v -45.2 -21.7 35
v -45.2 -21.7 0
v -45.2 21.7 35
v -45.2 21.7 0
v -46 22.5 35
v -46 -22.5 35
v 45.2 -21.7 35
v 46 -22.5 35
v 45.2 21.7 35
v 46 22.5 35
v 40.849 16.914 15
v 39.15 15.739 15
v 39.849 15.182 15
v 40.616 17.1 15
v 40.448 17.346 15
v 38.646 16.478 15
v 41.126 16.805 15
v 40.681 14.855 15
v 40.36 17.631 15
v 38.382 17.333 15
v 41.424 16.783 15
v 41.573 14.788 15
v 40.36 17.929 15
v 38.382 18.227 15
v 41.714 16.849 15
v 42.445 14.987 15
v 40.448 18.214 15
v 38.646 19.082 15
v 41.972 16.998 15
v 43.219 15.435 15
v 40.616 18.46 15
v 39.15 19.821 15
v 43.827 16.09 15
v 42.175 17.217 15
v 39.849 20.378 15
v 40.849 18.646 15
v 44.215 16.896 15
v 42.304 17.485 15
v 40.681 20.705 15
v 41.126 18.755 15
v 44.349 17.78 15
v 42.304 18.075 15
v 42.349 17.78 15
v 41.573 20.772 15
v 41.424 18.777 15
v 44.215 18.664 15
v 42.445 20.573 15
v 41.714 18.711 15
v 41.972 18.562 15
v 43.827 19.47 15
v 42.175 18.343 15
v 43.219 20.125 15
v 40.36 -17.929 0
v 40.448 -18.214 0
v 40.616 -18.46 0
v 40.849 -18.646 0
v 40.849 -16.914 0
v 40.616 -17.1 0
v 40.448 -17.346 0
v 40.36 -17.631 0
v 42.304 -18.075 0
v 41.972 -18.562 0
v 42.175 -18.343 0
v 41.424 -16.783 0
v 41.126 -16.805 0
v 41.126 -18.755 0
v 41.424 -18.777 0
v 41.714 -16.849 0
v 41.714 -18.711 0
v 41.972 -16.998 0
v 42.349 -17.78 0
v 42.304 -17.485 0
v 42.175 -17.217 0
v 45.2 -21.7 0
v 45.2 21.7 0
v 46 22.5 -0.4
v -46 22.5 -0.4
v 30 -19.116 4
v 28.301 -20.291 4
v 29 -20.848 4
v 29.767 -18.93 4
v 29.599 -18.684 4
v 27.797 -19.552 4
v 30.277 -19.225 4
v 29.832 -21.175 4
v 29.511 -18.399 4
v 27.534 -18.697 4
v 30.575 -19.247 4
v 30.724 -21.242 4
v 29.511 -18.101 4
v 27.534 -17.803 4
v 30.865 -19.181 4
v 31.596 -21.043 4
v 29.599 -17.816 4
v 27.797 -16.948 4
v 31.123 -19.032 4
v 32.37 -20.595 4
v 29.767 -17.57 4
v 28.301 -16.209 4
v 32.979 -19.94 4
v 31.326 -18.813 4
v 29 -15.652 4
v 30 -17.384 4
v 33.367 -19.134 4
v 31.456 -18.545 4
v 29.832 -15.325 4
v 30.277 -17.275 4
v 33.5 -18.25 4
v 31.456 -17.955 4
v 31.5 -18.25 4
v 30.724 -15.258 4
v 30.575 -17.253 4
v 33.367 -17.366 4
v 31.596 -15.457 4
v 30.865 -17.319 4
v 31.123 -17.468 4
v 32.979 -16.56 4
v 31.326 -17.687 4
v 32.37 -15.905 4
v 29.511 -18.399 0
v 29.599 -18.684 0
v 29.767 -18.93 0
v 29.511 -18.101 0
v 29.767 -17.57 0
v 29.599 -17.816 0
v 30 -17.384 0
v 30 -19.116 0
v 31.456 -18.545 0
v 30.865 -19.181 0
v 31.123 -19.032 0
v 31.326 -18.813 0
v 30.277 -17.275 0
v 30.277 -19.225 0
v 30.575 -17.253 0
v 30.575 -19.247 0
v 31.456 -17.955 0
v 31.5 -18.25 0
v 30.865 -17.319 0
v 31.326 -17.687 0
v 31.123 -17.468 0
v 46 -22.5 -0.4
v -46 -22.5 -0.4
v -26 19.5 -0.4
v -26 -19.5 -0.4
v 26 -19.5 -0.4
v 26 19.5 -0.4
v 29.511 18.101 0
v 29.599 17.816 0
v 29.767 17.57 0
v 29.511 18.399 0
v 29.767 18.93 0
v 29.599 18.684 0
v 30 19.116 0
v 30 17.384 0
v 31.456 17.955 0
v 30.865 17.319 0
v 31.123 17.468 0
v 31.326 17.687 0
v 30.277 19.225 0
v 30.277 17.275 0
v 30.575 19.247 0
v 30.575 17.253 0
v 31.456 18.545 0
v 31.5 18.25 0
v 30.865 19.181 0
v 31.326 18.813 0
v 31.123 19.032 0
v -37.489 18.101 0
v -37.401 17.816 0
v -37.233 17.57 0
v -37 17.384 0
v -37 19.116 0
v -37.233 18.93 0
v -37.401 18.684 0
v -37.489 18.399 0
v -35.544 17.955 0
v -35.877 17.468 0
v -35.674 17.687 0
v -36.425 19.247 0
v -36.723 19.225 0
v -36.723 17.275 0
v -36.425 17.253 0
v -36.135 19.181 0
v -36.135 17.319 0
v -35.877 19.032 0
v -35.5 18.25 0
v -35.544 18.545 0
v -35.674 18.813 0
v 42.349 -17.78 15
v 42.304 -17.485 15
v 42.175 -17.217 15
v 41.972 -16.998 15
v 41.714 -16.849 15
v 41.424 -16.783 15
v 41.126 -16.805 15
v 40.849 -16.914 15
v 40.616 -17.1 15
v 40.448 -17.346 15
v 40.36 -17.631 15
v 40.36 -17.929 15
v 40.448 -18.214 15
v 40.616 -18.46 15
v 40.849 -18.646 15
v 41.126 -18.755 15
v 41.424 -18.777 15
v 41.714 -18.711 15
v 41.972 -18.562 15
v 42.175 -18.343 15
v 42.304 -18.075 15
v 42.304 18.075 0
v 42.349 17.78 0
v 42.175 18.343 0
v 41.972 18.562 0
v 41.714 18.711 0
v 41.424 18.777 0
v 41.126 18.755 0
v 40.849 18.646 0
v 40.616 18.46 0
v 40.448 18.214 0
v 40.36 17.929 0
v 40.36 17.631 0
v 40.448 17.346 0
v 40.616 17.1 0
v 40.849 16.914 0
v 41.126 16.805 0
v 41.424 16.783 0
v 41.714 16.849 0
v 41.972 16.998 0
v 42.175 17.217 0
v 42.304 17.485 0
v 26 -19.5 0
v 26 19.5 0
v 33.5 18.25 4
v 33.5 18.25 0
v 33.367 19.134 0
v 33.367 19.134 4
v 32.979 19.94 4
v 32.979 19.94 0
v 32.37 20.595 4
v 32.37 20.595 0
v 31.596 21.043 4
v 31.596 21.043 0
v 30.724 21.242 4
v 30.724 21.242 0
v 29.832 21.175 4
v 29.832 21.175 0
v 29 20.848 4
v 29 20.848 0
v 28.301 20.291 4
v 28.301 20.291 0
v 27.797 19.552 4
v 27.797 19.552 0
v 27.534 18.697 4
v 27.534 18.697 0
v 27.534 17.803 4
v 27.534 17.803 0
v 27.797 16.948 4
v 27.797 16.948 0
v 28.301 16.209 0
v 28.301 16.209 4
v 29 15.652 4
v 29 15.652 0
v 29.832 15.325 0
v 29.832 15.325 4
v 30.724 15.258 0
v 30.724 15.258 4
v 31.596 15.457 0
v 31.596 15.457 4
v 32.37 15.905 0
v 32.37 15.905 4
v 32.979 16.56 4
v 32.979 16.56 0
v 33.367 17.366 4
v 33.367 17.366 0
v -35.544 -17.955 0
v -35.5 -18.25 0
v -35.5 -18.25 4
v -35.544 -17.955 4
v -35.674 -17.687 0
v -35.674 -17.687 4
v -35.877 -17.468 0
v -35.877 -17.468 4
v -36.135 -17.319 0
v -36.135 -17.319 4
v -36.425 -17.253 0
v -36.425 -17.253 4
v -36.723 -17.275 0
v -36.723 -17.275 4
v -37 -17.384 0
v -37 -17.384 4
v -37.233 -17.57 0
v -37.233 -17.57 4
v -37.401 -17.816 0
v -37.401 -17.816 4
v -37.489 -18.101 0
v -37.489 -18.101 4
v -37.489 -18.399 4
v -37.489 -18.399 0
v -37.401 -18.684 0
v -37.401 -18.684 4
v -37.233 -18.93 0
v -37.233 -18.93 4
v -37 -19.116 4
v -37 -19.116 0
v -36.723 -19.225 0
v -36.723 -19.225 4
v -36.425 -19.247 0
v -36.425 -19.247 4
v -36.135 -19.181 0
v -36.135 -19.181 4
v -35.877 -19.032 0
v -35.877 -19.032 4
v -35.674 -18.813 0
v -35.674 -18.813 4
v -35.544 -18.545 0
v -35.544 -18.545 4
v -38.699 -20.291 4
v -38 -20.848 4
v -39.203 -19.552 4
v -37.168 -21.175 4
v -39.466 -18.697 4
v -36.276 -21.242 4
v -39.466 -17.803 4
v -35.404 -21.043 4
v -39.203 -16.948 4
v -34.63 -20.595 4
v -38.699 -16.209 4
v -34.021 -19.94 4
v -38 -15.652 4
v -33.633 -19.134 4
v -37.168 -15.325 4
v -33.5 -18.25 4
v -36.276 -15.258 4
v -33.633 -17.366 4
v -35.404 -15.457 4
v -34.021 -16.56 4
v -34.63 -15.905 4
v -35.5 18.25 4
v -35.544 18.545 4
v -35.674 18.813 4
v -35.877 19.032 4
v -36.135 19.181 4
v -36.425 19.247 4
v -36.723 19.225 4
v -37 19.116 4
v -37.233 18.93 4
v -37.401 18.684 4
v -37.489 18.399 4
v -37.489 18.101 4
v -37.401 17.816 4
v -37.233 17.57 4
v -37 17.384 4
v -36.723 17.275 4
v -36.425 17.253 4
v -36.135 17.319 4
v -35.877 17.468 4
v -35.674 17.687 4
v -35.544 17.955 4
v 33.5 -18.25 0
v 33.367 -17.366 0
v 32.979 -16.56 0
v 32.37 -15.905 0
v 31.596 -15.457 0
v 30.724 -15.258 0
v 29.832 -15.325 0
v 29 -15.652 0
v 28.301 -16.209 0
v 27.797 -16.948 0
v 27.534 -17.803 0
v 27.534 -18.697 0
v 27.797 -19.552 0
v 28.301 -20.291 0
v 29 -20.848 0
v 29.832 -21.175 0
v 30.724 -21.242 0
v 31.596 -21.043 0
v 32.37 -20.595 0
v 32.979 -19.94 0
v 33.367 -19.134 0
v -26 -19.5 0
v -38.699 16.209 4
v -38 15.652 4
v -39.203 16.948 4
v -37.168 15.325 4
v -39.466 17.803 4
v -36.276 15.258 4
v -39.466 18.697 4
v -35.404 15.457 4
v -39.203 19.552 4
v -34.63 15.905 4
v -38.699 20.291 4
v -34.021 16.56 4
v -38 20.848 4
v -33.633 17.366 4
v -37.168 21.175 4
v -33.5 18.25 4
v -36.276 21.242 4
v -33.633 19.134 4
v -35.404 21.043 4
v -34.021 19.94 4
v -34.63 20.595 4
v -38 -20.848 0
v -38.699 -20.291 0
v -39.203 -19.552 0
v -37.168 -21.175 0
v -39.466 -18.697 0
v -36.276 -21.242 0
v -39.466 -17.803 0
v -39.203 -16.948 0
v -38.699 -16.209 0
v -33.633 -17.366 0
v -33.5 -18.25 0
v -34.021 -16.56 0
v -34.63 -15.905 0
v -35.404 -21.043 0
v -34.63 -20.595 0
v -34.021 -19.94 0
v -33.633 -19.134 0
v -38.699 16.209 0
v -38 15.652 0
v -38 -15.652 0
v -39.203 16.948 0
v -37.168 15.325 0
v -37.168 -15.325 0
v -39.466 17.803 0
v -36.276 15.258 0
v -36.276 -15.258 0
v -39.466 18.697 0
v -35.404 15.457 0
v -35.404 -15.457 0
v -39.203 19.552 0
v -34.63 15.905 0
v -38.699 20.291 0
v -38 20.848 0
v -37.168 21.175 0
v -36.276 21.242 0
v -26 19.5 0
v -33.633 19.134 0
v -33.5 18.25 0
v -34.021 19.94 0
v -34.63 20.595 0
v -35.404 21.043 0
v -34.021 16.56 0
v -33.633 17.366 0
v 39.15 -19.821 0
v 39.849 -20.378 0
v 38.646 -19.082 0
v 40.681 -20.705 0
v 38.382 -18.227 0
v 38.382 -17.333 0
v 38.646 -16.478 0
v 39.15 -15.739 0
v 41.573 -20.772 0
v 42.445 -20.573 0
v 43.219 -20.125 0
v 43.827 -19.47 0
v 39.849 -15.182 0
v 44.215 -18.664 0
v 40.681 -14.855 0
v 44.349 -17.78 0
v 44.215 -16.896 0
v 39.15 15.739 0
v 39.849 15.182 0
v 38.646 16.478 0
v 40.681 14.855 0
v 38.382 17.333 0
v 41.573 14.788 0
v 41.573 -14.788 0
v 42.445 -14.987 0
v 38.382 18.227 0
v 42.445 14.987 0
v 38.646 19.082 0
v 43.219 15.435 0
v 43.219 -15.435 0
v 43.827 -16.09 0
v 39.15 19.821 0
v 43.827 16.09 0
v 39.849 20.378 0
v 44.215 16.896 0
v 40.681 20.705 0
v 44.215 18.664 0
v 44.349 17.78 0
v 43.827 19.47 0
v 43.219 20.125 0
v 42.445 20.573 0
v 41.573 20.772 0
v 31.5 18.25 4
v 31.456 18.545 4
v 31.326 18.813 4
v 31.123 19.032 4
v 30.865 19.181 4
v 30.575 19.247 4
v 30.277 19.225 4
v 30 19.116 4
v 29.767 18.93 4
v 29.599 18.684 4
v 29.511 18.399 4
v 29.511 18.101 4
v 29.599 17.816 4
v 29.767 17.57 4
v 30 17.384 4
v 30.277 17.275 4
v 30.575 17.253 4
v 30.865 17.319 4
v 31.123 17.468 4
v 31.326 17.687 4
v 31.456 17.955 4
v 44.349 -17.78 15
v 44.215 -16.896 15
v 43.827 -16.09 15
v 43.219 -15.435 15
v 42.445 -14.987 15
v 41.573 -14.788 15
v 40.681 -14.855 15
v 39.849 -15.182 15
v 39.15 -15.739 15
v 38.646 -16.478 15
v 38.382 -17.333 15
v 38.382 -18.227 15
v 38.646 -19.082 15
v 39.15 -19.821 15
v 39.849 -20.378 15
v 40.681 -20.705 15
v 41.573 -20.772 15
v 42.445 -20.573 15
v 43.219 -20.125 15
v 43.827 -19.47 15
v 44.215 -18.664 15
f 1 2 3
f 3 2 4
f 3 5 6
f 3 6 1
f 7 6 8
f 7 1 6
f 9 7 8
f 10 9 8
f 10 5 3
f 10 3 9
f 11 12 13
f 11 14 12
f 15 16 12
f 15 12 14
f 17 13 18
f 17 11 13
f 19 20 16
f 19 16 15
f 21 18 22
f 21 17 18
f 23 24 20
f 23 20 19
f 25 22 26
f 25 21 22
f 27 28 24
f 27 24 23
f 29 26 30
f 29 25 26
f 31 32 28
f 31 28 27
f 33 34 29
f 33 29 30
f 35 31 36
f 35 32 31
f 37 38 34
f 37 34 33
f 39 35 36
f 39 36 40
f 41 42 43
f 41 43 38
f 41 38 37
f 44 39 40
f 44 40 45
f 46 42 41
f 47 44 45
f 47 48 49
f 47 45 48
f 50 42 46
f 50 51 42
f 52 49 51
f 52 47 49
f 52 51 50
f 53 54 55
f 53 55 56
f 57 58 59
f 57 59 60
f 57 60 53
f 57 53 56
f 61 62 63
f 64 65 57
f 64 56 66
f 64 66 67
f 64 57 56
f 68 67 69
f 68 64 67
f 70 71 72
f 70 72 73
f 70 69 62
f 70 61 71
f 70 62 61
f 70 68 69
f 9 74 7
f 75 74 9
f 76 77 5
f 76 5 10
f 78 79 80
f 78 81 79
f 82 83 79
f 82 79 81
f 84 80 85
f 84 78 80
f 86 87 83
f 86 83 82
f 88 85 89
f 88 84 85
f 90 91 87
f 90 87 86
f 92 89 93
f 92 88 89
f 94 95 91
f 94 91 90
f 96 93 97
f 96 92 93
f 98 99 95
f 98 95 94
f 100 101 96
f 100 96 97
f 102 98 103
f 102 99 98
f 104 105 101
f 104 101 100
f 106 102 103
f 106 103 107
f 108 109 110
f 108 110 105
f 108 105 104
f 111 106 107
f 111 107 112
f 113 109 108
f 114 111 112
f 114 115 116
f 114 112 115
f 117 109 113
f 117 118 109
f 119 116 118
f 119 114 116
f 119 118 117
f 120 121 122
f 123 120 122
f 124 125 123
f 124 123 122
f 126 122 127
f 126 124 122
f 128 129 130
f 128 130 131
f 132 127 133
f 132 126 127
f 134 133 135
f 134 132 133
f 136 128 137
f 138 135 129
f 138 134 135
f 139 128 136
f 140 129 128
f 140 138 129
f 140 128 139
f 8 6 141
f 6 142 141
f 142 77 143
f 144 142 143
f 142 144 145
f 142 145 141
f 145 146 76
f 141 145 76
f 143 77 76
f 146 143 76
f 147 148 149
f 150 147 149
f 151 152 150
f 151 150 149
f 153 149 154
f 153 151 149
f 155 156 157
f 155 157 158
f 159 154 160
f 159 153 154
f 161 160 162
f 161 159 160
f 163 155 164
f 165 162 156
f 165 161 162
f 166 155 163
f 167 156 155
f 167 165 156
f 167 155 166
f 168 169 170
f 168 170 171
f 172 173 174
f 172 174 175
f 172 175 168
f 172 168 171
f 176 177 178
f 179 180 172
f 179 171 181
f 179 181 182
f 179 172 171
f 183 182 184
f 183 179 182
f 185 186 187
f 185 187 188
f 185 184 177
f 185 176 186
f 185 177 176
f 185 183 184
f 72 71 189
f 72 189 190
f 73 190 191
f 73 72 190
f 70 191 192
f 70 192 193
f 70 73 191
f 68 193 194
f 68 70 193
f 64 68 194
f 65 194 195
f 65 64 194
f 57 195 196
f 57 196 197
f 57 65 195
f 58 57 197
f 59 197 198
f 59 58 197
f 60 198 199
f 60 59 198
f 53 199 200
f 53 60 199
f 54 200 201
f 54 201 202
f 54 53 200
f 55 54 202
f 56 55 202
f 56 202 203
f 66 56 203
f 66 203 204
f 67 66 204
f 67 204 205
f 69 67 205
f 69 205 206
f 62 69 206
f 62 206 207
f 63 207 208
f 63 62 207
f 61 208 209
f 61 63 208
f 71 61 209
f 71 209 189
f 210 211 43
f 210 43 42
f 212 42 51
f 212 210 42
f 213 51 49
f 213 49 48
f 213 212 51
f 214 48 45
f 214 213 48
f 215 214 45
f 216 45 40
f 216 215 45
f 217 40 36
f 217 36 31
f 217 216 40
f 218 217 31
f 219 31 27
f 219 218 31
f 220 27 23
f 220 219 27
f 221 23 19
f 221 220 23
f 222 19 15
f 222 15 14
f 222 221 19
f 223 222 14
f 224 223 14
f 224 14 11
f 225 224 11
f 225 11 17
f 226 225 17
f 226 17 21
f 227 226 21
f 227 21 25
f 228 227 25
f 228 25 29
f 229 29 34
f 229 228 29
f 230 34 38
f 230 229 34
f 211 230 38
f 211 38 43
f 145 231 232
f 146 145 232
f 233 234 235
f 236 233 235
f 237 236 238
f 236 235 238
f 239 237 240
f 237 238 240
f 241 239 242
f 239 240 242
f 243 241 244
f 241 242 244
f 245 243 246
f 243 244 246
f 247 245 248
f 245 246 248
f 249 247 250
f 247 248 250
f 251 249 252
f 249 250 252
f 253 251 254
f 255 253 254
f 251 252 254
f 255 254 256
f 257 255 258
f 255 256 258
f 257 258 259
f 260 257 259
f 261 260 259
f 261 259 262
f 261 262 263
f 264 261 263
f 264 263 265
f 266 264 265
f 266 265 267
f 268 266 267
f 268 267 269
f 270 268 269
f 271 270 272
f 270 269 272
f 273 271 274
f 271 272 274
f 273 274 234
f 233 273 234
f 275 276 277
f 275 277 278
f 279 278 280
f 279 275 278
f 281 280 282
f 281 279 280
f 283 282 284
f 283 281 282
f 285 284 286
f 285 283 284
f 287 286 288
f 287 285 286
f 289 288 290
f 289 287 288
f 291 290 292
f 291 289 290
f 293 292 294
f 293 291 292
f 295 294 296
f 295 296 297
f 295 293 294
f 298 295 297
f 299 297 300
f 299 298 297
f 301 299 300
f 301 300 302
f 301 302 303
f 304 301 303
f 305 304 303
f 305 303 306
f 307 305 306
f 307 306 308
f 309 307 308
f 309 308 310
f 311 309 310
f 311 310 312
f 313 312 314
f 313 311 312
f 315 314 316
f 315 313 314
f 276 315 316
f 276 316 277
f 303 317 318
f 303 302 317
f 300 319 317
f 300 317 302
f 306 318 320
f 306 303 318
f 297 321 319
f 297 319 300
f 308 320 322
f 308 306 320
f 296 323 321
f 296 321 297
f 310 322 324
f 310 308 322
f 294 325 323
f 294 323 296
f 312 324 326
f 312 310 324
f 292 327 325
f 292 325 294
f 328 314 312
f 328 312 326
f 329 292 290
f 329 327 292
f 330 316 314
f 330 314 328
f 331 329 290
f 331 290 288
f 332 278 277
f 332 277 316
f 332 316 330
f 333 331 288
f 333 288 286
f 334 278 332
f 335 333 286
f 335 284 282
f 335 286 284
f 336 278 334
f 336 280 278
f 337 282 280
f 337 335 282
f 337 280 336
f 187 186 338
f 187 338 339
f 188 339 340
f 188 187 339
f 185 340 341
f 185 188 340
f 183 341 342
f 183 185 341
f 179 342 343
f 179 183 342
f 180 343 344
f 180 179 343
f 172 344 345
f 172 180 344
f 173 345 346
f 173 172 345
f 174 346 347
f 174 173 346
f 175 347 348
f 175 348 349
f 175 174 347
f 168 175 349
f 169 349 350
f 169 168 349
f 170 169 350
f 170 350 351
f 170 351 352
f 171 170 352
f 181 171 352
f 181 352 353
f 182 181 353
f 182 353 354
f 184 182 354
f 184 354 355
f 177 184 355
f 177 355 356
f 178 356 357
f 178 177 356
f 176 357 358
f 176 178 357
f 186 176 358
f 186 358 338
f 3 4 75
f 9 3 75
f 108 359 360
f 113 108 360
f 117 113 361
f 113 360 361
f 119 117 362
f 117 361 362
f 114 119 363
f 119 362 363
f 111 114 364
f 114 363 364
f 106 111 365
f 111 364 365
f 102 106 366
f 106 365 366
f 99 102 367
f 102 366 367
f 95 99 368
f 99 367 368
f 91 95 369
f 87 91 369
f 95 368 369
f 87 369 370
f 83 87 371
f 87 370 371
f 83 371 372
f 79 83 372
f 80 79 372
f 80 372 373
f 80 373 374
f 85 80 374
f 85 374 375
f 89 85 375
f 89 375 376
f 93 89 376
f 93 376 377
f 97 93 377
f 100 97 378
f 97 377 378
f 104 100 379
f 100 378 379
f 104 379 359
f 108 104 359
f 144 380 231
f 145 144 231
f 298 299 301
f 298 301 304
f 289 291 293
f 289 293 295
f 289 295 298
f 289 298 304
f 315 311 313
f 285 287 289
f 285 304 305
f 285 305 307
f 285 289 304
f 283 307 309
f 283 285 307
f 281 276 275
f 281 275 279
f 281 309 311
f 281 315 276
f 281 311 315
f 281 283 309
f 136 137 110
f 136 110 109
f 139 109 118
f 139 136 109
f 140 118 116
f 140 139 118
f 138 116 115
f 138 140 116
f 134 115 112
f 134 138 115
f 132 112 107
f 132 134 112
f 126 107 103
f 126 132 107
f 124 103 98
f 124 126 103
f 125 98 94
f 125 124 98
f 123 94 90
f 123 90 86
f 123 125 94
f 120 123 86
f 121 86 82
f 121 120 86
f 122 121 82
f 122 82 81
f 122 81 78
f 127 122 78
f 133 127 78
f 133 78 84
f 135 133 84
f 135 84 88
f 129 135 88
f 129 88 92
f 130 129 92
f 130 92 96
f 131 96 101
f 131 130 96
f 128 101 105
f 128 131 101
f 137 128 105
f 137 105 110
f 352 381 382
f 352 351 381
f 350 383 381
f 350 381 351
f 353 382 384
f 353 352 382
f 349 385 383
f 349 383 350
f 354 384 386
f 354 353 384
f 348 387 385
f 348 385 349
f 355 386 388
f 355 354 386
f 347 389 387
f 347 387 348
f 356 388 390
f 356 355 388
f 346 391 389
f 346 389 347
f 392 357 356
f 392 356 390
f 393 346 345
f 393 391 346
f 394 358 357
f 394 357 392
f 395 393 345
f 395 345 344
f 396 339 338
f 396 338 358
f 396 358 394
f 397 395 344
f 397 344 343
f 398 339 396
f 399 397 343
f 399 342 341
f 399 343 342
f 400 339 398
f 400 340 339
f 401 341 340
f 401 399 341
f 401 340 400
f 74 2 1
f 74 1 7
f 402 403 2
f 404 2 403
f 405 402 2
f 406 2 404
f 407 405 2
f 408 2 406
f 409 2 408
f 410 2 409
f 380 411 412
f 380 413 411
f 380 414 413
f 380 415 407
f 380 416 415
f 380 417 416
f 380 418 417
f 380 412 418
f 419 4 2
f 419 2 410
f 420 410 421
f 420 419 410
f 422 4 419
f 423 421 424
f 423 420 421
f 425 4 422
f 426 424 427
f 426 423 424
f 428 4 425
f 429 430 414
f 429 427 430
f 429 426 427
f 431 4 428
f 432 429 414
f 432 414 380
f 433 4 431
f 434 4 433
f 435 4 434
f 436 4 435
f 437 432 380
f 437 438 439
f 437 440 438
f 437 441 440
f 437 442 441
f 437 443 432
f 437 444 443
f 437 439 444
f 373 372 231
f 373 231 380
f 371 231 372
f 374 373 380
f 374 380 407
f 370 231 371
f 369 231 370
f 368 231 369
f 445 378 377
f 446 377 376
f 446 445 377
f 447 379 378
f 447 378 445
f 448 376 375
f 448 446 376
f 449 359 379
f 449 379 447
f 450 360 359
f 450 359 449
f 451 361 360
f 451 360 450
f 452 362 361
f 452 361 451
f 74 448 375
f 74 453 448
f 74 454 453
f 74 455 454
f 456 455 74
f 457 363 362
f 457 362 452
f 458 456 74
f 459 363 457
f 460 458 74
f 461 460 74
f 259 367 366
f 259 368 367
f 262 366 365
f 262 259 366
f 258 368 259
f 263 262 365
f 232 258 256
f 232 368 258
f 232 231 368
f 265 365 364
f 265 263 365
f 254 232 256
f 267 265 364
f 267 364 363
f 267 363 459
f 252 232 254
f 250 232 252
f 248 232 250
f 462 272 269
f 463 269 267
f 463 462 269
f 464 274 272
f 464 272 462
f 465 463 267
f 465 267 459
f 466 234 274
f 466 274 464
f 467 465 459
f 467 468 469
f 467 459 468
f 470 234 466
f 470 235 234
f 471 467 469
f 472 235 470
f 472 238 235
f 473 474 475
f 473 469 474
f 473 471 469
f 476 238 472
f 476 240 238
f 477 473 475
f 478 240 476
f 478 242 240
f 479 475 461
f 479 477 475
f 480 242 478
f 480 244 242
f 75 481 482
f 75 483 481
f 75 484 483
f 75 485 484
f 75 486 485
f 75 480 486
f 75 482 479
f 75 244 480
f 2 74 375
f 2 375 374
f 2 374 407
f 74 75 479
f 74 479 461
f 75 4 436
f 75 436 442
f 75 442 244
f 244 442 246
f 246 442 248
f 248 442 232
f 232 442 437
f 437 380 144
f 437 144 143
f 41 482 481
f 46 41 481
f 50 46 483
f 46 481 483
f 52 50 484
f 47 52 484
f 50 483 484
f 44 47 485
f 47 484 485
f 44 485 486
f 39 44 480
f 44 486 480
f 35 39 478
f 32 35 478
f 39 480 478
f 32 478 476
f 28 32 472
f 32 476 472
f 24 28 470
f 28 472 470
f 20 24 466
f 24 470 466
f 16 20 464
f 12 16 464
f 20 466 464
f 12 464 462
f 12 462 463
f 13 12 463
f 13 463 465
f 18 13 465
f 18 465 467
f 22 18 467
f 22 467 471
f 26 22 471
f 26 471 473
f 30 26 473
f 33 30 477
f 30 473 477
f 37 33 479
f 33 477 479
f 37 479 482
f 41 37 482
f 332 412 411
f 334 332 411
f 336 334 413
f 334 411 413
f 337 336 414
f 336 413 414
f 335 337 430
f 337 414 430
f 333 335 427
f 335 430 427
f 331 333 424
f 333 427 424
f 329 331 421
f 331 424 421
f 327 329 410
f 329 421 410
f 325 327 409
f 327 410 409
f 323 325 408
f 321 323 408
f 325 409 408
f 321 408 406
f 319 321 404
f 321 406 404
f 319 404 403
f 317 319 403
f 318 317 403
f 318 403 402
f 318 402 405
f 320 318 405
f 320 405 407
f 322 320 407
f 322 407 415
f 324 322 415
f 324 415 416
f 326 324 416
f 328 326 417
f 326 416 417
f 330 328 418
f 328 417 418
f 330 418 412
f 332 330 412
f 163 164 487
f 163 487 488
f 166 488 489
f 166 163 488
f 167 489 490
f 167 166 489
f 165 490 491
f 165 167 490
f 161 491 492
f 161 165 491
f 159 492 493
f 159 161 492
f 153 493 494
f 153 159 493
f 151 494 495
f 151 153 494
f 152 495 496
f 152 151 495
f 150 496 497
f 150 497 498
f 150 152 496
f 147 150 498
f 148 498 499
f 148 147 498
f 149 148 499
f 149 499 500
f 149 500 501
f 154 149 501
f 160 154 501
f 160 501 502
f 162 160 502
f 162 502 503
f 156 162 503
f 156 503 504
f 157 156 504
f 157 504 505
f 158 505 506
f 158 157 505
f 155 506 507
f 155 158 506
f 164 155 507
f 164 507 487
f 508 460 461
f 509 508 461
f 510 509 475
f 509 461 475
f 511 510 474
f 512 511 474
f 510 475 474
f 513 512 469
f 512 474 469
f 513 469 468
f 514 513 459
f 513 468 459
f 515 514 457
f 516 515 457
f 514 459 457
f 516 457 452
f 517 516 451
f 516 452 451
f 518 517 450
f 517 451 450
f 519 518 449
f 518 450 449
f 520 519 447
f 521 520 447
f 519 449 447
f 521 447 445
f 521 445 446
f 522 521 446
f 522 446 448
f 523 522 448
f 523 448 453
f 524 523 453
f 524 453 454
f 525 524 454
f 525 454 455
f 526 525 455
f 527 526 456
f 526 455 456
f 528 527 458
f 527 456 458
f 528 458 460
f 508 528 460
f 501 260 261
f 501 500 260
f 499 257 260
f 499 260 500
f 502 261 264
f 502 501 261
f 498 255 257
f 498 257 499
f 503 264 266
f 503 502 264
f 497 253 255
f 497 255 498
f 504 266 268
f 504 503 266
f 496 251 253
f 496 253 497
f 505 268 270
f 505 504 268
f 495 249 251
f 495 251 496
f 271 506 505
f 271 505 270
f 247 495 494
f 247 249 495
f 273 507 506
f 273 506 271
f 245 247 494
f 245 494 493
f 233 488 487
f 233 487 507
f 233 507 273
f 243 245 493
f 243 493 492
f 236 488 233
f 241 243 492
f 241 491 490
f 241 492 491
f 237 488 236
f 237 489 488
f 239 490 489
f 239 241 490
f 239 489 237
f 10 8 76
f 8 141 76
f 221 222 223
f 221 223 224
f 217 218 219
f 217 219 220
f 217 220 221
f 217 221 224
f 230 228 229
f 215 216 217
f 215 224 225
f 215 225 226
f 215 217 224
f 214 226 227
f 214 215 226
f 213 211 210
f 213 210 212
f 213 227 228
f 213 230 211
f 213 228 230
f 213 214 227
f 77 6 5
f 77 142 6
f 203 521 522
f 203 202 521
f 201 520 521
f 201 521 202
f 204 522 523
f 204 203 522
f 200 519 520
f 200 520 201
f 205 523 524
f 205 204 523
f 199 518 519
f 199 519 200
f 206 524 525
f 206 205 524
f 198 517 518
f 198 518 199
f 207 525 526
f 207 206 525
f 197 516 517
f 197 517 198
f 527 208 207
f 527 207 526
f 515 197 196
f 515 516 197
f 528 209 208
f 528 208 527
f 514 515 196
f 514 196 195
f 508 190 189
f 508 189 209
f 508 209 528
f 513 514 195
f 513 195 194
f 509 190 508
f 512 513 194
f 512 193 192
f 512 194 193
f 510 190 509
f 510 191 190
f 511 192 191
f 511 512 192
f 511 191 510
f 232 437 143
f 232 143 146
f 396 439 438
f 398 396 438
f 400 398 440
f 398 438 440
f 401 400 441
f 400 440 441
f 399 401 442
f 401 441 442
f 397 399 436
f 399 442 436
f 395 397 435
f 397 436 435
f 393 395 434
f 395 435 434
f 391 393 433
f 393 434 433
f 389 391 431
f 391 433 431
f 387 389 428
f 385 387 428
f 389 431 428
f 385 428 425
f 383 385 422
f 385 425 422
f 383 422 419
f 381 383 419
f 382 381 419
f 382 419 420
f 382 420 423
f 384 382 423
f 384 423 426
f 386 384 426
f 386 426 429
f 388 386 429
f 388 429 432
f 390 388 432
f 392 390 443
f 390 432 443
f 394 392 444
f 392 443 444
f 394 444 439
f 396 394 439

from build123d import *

# Parameters (mm, degrees)
SKETCH_W      = 92
SKETCH_H      = 45
SKETCH_W_2    = 52
SKETCH_H_2    = 39
PAD_DEPTH     = 0.4
SKETCH003_W   = 92
SKETCH003_H   = 45
SKETCH003_W_2 = 90.4
SKETCH003_H_2 = 43.4
PAD001_DEPTH  = 35
SKETCH001_R   = 3
SKETCH001_R_2 = 1
PAD002_DEPTH  = 4
SKETCH004_R   = 3
SKETCH004_R_2 = 1
PAD003_DEPTH  = 15


with BuildPart() as part:
    # Sketch → Pad (new body)
    with BuildSketch(Plane.XY):
        Rectangle(SKETCH_W, SKETCH_H)
        Rectangle(SKETCH_W_2, SKETCH_H_2, mode=Mode.SUBTRACT)
    extrude(amount=-PAD_DEPTH)

    # Sketch003 → Pad001 (join)
    with BuildSketch(Plane.XY):
        Rectangle(SKETCH003_W, SKETCH003_H)
        Rectangle(SKETCH003_W_2, SKETCH003_H_2, mode=Mode.SUBTRACT)
    extrude(amount=PAD001_DEPTH)

    # Sketch001 → Pad002 (join)
    with BuildSketch(Plane.XY):
        with Locations((30.5, 18.25)):
            Circle(SKETCH001_R)
        with Locations((30.5, 18.25)):
            Circle(SKETCH001_R_2, mode=Mode.SUBTRACT)
        with Locations((30.5, -18.25)):
            Circle(SKETCH001_R)
        with Locations((30.5, -18.25)):
            Circle(SKETCH001_R_2, mode=Mode.SUBTRACT)
        with Locations((-36.5, 18.25)):
            Circle(SKETCH001_R)
        with Locations((-36.5, 18.25)):
            Circle(SKETCH001_R_2, mode=Mode.SUBTRACT)
        with Locations((-36.5, -18.25)):
            Circle(SKETCH001_R)
        with Locations((-36.5, -18.25)):
            Circle(SKETCH001_R_2, mode=Mode.SUBTRACT)
    extrude(amount=PAD002_DEPTH)

    # Sketch004 → Pad003 (join)
    with BuildSketch(Plane.XY):
        with Locations((41.348775, 17.78)):
            Circle(SKETCH004_R)
        with Locations((41.348775, 17.78)):
            Circle(SKETCH004_R_2, mode=Mode.SUBTRACT)
        with Locations((41.348775, -17.78)):
            Circle(SKETCH004_R)
        with Locations((41.348775, -17.78)):
            Circle(SKETCH004_R_2, mode=Mode.SUBTRACT)
    extrude(amount=PAD003_DEPTH)


solid = part.part
